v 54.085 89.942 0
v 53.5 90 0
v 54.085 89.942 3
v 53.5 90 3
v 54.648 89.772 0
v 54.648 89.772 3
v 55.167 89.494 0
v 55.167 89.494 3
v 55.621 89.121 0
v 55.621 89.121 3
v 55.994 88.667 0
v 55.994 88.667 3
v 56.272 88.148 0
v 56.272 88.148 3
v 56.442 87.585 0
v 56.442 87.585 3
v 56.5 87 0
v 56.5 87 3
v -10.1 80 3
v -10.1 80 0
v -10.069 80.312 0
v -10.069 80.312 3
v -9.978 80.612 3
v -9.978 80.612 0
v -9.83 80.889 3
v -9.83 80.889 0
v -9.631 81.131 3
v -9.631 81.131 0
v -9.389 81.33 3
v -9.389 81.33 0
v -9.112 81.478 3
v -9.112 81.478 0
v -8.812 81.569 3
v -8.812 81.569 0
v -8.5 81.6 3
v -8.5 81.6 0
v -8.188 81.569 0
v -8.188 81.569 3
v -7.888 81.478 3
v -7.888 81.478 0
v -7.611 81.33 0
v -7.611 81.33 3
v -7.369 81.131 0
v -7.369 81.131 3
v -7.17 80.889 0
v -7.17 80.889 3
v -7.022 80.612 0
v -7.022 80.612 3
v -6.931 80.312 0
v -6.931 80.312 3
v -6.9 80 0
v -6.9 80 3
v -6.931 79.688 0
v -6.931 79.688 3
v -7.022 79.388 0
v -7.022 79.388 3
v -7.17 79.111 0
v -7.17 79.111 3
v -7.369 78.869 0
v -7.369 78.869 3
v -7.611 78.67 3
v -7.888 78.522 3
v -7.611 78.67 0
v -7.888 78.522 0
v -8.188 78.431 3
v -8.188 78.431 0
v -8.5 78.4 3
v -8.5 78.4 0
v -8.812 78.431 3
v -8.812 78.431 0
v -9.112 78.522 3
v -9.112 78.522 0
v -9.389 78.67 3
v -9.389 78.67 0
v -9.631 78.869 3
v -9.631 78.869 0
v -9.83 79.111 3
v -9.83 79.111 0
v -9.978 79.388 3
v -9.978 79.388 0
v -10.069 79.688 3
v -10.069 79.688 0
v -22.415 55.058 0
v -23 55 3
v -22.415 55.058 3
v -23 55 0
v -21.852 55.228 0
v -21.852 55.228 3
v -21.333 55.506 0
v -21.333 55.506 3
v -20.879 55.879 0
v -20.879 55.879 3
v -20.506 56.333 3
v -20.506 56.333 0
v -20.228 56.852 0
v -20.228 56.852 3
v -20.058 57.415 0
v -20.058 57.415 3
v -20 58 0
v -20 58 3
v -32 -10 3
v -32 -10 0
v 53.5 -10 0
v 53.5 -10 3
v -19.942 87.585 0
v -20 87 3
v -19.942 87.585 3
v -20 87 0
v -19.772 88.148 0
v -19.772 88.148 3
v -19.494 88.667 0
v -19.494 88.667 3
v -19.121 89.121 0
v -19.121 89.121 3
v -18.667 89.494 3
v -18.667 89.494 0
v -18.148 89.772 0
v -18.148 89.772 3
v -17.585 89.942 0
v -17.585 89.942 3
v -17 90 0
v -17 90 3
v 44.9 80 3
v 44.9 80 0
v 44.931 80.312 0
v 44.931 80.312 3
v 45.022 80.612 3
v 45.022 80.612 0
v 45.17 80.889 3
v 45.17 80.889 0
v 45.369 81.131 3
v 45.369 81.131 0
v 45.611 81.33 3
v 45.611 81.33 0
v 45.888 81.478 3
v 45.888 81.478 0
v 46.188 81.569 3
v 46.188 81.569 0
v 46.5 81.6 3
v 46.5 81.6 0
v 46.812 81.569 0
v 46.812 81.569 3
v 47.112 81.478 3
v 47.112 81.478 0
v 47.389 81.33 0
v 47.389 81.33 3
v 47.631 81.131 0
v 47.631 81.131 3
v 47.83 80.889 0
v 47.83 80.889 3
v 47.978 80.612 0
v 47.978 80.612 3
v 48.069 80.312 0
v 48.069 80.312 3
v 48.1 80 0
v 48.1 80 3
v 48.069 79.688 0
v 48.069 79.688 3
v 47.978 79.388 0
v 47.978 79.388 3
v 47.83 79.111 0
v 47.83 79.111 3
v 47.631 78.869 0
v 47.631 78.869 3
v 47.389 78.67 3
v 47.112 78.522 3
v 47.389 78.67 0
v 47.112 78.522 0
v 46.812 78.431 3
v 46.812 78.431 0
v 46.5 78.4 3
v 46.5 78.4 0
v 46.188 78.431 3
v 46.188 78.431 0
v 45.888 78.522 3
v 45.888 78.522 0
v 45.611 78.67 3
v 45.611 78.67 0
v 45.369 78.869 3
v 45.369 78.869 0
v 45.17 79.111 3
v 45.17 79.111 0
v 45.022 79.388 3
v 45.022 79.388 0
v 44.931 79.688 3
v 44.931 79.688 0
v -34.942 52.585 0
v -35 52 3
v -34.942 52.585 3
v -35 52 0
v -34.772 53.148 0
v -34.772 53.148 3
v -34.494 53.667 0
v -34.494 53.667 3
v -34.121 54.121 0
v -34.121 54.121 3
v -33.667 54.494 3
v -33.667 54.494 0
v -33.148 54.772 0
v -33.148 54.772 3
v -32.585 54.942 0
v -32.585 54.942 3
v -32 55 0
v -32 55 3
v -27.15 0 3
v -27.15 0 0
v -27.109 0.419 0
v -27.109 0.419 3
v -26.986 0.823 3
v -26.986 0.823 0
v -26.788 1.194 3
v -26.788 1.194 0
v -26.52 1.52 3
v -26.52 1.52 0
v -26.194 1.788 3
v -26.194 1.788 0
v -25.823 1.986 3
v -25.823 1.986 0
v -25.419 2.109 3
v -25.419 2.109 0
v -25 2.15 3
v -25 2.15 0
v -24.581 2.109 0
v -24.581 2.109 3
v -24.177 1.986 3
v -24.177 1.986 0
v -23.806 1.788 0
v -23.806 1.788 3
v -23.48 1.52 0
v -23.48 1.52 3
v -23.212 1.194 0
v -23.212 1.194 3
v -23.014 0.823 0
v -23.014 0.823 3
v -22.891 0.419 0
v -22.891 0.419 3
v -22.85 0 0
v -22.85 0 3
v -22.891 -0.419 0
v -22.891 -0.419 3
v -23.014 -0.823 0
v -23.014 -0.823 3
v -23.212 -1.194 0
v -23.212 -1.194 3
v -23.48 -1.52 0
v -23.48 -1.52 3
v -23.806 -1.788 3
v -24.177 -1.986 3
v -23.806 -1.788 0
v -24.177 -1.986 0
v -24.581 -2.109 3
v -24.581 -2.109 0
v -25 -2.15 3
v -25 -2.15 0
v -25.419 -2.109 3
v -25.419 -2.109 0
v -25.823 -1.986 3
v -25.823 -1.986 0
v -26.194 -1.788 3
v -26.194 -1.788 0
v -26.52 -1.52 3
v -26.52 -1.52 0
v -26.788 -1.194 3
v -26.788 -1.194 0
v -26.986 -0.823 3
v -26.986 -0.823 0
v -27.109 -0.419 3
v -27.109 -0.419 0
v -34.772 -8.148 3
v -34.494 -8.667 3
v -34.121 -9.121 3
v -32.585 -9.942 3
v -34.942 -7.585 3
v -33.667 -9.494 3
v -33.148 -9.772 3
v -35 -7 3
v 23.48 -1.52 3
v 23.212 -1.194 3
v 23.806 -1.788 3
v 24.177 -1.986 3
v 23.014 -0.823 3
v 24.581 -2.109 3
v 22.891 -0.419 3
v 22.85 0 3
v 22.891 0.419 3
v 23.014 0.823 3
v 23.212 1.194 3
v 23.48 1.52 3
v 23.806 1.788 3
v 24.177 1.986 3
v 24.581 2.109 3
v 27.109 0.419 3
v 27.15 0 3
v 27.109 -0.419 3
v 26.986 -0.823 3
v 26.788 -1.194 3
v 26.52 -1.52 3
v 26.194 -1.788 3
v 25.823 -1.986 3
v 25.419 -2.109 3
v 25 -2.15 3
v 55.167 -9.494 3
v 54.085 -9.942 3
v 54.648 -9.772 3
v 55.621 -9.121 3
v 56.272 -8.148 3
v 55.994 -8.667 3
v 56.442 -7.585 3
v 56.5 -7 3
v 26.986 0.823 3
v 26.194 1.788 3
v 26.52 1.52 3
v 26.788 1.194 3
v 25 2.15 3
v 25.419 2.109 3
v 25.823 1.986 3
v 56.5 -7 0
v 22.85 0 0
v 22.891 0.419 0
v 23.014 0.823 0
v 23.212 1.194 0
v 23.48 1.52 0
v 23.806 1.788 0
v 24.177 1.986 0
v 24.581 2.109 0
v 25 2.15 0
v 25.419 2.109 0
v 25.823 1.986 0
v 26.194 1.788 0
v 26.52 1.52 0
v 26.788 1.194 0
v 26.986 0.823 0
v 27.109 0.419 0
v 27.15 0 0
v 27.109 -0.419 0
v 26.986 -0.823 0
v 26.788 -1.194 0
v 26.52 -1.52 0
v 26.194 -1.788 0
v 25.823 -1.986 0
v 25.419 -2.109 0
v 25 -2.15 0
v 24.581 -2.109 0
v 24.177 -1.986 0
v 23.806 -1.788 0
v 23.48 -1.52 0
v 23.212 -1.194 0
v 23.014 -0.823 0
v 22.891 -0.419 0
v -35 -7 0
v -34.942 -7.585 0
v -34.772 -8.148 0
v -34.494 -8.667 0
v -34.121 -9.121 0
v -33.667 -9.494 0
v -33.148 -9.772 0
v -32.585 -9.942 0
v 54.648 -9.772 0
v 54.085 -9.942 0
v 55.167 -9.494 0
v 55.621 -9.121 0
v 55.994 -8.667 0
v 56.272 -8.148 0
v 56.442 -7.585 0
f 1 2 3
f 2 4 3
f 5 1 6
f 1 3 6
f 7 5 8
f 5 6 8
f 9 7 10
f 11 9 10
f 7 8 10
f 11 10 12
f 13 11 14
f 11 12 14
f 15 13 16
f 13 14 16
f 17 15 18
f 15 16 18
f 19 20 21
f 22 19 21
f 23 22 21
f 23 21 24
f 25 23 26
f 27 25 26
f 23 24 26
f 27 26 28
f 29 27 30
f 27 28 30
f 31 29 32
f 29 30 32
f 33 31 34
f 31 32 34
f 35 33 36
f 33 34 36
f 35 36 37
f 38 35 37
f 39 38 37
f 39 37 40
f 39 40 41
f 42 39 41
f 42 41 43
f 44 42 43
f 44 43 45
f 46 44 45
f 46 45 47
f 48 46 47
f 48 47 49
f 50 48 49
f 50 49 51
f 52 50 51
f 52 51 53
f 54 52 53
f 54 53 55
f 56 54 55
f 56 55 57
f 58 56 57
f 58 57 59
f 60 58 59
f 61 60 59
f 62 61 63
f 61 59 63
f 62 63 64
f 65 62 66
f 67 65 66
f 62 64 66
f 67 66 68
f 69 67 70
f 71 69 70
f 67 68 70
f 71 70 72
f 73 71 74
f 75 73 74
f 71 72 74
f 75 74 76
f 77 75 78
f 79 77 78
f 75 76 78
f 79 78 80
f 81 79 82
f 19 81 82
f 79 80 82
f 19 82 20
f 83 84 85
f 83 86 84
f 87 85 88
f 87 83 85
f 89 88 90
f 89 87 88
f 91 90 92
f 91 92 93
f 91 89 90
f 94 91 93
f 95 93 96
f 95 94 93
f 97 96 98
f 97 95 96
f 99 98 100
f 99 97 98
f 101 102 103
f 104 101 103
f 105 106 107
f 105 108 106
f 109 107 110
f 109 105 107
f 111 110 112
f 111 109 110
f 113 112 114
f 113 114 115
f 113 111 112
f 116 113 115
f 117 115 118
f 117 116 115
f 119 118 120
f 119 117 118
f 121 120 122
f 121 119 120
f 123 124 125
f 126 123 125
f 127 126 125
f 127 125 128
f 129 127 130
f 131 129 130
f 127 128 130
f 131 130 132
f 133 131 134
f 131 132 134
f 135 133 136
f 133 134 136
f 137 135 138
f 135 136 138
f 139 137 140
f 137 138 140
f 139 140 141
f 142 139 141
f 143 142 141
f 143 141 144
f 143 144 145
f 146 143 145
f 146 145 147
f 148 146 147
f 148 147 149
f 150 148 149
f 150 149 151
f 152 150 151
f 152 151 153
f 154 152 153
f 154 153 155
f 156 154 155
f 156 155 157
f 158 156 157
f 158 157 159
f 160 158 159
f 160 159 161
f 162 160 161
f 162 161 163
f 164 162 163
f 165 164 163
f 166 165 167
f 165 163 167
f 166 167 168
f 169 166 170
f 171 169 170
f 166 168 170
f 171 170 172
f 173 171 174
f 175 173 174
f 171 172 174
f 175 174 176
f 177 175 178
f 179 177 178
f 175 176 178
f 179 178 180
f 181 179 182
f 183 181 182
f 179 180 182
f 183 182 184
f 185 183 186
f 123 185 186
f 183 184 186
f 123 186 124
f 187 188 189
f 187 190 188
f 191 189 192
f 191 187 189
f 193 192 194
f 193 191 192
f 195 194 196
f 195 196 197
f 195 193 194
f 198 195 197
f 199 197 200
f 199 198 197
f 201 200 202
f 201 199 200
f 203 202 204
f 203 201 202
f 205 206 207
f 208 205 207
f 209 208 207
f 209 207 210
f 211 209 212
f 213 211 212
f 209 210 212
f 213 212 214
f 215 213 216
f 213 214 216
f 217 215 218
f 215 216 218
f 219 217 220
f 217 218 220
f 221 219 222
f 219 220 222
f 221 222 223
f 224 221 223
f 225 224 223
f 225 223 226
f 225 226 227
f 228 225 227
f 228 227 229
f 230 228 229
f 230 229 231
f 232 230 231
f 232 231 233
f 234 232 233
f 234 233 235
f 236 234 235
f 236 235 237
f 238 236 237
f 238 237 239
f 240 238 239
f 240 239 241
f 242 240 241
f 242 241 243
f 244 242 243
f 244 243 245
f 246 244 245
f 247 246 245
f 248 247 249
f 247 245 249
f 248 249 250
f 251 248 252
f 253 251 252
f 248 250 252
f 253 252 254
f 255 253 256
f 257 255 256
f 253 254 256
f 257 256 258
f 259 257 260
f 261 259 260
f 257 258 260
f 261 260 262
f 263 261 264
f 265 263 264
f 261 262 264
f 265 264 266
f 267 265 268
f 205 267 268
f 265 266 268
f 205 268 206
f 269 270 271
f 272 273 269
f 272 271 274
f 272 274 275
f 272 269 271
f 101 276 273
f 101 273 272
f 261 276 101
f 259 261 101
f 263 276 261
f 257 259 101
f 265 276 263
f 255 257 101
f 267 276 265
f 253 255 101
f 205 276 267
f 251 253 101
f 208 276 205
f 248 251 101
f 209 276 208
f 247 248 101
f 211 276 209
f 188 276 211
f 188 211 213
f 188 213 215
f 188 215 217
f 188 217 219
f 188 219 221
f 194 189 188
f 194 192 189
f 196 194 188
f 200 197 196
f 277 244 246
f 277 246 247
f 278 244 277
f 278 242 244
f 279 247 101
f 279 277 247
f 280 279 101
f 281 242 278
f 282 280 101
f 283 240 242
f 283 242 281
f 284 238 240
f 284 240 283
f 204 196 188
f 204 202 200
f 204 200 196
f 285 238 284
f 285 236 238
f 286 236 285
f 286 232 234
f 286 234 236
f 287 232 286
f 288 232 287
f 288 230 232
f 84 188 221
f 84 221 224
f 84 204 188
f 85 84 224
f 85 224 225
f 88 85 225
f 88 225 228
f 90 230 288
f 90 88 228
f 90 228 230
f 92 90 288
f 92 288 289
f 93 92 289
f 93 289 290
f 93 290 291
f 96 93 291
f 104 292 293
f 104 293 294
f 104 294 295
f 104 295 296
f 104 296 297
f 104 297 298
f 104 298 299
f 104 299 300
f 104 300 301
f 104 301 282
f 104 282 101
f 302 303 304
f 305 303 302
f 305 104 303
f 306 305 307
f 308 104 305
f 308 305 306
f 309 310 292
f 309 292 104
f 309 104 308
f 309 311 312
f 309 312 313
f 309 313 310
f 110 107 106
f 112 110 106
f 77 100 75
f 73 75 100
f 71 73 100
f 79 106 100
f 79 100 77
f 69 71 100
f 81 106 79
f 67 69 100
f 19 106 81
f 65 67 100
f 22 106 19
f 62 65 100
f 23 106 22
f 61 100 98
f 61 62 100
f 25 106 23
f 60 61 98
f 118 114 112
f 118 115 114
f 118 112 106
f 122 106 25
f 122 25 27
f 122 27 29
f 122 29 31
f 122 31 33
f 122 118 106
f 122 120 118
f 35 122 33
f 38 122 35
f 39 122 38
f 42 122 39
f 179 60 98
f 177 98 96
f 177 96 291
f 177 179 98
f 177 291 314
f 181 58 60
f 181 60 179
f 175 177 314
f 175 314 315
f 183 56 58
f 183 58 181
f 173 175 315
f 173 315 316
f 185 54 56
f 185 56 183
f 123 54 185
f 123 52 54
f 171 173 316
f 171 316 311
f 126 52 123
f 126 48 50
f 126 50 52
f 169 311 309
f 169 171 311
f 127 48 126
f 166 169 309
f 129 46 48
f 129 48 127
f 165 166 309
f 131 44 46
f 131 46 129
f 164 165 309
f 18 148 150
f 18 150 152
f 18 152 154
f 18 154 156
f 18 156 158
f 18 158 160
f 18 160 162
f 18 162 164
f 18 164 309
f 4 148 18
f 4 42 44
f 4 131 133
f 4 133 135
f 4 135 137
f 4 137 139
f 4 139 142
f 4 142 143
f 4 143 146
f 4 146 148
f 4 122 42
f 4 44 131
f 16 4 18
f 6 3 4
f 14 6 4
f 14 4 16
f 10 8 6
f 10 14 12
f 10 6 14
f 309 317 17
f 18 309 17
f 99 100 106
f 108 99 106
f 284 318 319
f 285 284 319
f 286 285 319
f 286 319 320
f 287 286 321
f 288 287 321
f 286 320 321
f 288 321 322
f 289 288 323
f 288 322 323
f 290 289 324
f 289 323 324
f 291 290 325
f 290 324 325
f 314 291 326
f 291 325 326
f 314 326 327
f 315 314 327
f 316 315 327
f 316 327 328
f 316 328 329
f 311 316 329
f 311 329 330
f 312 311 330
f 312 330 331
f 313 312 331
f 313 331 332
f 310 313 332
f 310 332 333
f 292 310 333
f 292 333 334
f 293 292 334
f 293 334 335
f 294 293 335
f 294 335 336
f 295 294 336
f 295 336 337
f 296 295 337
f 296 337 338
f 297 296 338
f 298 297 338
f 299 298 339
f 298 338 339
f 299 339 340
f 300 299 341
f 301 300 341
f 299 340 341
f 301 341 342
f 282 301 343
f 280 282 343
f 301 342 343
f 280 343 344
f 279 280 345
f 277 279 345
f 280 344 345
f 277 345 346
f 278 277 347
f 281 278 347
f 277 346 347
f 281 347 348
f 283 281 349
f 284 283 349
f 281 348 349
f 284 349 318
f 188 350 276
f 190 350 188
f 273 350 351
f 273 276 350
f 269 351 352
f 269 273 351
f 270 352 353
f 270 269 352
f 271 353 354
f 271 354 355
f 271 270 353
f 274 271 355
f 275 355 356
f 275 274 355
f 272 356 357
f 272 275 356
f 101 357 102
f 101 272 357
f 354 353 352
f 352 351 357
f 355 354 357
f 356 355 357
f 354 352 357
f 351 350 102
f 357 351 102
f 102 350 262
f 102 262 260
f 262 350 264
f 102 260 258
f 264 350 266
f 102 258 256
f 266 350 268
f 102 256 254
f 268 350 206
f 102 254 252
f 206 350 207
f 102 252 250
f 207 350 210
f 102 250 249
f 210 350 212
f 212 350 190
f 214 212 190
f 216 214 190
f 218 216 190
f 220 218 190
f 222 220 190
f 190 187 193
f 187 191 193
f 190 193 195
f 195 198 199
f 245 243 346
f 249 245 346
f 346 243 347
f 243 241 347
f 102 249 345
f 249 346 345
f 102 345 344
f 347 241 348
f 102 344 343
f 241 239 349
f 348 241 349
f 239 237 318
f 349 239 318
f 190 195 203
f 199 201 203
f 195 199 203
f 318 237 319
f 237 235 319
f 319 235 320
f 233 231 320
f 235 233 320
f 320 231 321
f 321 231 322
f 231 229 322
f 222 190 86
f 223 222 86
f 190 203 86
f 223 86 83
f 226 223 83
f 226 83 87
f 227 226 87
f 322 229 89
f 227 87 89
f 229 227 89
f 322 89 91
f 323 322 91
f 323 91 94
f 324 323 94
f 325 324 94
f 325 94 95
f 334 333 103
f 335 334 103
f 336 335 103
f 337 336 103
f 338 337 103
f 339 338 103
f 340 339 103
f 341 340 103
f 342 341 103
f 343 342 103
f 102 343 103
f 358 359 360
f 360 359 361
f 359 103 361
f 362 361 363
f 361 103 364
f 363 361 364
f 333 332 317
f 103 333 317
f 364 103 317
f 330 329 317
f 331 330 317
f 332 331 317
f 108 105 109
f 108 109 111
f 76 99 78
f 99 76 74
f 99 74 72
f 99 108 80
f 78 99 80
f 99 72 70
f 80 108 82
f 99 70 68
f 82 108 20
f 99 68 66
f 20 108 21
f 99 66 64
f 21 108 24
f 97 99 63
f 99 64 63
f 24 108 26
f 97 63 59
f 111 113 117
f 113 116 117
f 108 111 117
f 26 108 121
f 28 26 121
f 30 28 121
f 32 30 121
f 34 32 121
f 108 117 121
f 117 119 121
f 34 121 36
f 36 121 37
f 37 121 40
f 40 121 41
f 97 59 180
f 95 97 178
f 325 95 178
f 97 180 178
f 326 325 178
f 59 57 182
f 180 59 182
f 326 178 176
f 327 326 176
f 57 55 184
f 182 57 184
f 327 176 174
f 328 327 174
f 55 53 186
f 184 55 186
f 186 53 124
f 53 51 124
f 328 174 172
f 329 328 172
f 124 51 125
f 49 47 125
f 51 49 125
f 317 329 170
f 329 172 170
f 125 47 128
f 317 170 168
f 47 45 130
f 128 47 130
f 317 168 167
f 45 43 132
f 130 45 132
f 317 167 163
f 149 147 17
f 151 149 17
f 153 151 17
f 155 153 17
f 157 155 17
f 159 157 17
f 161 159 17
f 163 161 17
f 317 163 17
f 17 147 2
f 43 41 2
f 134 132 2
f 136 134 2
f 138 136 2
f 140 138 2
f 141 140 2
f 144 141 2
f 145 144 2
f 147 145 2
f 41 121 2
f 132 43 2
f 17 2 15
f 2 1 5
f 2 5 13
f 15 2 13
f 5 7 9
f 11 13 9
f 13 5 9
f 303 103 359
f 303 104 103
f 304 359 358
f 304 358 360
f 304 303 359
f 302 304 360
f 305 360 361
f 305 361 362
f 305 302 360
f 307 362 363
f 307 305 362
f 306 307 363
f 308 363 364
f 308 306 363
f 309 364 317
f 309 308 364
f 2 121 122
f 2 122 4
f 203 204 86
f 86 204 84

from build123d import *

# Parameters (mm, degrees)
SKETCH1_W            = 91.5
SKETCH1_H            = 100
BOSS_EXTRUDE1_DEPTH  = 3
M4_CLEARANCE_HOLE1_D = 4.3
M3_CLEARANCE_HOLE1_D = 3.2
SKETCH6_W            = 15
SKETCH6_H            = 35
CUT_EXTRUDE1_DEPTH   = 107.30733747
FILLET1_R            = 3


with BuildPart() as part:
    # Sketch1 → Boss-Extrude1 (new body)
    with BuildSketch(Plane.XY):
        with Locations((10.75, 40)):
            Rectangle(SKETCH1_W, SKETCH1_H)
    extrude(amount=BOSS_EXTRUDE1_DEPTH)

    # M4 Clearance Hole1 (through all)
    with Locations(Plane.XY.offset(3)):
        with Locations((-25, 0), (25, 0)):
            Hole(M4_CLEARANCE_HOLE1_D / 2)

    # M3 Clearance Hole1 (through all)
    with Locations(Plane.XY.offset(3)):
        with Locations((-8.5, 80), (46.5, 80)):
            Hole(M3_CLEARANCE_HOLE1_D / 2)

    # Sketch6 → Cut-Extrude1 (cut, through all)
    with BuildSketch(Plane.XY.offset(3)):
        with Locations((-27.5, 72.5)):
            Rectangle(SKETCH6_W, SKETCH6_H)
    extrude(amount=-CUT_EXTRUDE1_DEPTH, mode=Mode.SUBTRACT)

    # Fillet1
    fillet1_edges = [part.edges().sort_by_distance(p)[0] for p in [
        (-20, 90, 1.5),
        (-20, 55, 1.5),
        (-35, 55, 1.5),
        (56.5, 90, 1.5),
        (56.5, -10, 1.5),
        (-35, -10, 1.5),
    ]]
    fillet(fillet1_edges, radius=FILLET1_R)


solid = part.part
